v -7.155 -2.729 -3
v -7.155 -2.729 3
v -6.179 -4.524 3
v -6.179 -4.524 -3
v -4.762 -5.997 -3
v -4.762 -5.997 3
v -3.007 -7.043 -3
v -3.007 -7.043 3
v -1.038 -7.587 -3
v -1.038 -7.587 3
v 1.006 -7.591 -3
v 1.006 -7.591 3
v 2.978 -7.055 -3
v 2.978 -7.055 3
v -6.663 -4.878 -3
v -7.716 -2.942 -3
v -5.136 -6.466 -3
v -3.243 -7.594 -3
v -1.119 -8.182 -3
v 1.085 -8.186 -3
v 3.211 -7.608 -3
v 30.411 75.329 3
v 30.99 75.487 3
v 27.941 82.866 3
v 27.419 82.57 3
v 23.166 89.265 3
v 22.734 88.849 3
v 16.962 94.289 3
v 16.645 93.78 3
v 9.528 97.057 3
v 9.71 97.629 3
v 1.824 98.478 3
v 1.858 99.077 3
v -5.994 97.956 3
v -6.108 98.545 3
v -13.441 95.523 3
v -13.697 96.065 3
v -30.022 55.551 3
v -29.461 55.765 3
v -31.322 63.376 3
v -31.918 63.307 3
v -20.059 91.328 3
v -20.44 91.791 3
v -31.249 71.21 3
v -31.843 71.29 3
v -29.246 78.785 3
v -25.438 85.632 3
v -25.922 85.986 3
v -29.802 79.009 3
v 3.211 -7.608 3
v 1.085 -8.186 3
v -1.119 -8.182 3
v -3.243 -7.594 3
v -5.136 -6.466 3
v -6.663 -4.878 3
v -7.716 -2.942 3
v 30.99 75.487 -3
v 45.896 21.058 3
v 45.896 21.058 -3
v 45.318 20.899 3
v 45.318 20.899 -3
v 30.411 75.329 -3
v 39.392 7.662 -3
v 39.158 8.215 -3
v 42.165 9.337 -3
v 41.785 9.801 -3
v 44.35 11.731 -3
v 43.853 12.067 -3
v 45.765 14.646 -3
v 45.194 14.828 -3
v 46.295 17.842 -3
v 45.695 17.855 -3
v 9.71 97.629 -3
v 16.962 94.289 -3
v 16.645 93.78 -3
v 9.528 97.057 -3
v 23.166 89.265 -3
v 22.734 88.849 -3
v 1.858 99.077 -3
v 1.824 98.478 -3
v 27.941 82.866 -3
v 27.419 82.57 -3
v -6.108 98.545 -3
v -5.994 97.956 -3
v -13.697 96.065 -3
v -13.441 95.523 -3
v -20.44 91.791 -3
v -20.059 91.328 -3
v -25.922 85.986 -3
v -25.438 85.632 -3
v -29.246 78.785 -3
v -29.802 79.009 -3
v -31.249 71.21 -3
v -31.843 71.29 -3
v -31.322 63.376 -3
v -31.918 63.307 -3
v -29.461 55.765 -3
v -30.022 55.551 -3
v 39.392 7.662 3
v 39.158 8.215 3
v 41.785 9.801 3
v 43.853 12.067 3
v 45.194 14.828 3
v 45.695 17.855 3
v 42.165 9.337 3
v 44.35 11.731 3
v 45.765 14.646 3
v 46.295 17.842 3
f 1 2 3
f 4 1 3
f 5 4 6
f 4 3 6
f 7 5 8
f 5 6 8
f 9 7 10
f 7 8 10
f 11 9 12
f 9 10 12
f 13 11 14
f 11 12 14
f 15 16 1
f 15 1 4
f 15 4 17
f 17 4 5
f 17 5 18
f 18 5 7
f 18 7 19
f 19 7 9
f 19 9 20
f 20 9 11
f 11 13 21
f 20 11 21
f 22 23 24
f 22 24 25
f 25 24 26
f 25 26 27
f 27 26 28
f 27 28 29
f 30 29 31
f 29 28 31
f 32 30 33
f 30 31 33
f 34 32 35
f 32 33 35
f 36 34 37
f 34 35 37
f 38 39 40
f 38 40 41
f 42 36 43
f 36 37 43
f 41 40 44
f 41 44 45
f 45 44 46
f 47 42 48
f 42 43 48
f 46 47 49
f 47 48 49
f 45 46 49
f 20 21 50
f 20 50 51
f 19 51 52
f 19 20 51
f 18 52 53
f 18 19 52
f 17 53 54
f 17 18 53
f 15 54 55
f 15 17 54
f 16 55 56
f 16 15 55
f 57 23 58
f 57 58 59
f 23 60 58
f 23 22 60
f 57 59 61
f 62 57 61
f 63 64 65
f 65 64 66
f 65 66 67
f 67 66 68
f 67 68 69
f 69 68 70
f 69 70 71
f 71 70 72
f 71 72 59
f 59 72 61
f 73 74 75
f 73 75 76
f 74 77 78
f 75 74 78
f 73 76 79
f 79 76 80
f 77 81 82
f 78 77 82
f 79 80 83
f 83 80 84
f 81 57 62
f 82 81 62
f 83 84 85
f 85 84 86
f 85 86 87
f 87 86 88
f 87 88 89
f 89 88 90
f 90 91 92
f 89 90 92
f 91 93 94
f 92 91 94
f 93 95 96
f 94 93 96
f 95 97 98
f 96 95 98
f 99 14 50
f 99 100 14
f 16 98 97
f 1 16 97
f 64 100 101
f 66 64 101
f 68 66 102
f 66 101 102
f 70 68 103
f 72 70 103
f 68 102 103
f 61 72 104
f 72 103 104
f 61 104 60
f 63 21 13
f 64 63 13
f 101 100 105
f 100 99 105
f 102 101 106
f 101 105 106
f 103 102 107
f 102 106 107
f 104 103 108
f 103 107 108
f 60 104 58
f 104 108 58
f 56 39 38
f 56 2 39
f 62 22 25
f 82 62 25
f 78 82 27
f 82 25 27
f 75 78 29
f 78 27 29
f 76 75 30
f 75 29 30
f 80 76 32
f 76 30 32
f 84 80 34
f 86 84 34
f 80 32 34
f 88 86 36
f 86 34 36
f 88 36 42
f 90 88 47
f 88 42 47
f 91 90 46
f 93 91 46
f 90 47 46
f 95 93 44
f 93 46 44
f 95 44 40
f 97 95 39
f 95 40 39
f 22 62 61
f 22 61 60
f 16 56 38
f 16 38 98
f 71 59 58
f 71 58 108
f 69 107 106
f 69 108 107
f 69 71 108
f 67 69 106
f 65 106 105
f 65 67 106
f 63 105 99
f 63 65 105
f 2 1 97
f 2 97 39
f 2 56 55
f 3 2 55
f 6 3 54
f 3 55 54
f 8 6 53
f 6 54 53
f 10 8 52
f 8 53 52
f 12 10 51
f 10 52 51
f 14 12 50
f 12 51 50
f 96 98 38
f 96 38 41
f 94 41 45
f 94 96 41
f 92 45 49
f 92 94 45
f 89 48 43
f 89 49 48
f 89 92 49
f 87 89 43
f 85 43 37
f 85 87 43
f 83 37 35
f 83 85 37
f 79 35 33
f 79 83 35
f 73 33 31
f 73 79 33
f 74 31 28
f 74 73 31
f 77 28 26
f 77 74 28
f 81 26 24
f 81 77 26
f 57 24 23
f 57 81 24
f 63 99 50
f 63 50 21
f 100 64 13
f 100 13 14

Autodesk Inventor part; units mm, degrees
sketch "Sketch Path" plane through (0, 0, 0) normal (0, 0, 1) x (1, 0, 0)
  arc A0 (-7.4354, -2.8355) -> (3.0943, -7.3315) centre (0, 0) ccw
  arc A1 (30.7005, 75.4079) -> (-29.7418, 55.6581) centre (0, 67) ccw
  arc A2 (39.275, 7.9388) -> (45.607, 20.9787) centre (34.9977, 18.0732) ccw
  line L0 (39.275, 7.9388) -> (3.0943, -7.3315)
  line L1 (-7.4354, -2.8355) -> (-29.7418, 55.6581)
  line L2 (30.7005, 75.4079) -> (45.607, 20.9787)
ref_plane "Cross Section Plane" through (3.0943, -7.3315, 0) normal (0.9213, 0.3888, 0) x (0, 0, 1)
ref_plane "Work Plane2" through (0, 0, 0) normal (-1, 0, 0) x (0, 0, 1)
ref_plane "Work Plane3" through (0, 67, 0) normal (0.3476, -0.9376, 0) x (0, 0, 1)
sketch "Cross Section" plane through (3.0943, -7.3315, 0) normal (0.9213, 0.3888, 0) x (0, 0, 1)
  line L0 (-3, 0.3) -> (3, 0.3)
  line L1 (3, 0.3) -> (3, -0.3)
  line L2 (3, -0.3) -> (-3, -0.3)
  line L3 (-3, -0.3) -> (-3, 0.3)
  line L4 (-3, 0) -> (3, 0) construction
  point P0 (0, 0)
  point P1 (0, 0)
  dimension "d0" = 6
  dimension "d4" = 0.3
  dimension "d5" = 0.3
sweep "Belt" add profiles "Cross Section" path "Sketch Path"
equation "\"d0\" = da_B"
equation "\"d4\" = da_a"
equation "\"d5\" = da_a2"
equation "\"da_B\" = 6"
equation "\"da_pb\" = 2.5"
equation "\"da_a\" = 0.3"
equation "\"da_S\" = 1.5"
equation "\"da_Beta\" = 20deg"
equation "\"da_Ht\" = 0.7"
equation "\"da_H\" = 1.3"
equation "\"da_a2\" = 0.3"
properties part number "Synchronous Belt" material "Rubber"
